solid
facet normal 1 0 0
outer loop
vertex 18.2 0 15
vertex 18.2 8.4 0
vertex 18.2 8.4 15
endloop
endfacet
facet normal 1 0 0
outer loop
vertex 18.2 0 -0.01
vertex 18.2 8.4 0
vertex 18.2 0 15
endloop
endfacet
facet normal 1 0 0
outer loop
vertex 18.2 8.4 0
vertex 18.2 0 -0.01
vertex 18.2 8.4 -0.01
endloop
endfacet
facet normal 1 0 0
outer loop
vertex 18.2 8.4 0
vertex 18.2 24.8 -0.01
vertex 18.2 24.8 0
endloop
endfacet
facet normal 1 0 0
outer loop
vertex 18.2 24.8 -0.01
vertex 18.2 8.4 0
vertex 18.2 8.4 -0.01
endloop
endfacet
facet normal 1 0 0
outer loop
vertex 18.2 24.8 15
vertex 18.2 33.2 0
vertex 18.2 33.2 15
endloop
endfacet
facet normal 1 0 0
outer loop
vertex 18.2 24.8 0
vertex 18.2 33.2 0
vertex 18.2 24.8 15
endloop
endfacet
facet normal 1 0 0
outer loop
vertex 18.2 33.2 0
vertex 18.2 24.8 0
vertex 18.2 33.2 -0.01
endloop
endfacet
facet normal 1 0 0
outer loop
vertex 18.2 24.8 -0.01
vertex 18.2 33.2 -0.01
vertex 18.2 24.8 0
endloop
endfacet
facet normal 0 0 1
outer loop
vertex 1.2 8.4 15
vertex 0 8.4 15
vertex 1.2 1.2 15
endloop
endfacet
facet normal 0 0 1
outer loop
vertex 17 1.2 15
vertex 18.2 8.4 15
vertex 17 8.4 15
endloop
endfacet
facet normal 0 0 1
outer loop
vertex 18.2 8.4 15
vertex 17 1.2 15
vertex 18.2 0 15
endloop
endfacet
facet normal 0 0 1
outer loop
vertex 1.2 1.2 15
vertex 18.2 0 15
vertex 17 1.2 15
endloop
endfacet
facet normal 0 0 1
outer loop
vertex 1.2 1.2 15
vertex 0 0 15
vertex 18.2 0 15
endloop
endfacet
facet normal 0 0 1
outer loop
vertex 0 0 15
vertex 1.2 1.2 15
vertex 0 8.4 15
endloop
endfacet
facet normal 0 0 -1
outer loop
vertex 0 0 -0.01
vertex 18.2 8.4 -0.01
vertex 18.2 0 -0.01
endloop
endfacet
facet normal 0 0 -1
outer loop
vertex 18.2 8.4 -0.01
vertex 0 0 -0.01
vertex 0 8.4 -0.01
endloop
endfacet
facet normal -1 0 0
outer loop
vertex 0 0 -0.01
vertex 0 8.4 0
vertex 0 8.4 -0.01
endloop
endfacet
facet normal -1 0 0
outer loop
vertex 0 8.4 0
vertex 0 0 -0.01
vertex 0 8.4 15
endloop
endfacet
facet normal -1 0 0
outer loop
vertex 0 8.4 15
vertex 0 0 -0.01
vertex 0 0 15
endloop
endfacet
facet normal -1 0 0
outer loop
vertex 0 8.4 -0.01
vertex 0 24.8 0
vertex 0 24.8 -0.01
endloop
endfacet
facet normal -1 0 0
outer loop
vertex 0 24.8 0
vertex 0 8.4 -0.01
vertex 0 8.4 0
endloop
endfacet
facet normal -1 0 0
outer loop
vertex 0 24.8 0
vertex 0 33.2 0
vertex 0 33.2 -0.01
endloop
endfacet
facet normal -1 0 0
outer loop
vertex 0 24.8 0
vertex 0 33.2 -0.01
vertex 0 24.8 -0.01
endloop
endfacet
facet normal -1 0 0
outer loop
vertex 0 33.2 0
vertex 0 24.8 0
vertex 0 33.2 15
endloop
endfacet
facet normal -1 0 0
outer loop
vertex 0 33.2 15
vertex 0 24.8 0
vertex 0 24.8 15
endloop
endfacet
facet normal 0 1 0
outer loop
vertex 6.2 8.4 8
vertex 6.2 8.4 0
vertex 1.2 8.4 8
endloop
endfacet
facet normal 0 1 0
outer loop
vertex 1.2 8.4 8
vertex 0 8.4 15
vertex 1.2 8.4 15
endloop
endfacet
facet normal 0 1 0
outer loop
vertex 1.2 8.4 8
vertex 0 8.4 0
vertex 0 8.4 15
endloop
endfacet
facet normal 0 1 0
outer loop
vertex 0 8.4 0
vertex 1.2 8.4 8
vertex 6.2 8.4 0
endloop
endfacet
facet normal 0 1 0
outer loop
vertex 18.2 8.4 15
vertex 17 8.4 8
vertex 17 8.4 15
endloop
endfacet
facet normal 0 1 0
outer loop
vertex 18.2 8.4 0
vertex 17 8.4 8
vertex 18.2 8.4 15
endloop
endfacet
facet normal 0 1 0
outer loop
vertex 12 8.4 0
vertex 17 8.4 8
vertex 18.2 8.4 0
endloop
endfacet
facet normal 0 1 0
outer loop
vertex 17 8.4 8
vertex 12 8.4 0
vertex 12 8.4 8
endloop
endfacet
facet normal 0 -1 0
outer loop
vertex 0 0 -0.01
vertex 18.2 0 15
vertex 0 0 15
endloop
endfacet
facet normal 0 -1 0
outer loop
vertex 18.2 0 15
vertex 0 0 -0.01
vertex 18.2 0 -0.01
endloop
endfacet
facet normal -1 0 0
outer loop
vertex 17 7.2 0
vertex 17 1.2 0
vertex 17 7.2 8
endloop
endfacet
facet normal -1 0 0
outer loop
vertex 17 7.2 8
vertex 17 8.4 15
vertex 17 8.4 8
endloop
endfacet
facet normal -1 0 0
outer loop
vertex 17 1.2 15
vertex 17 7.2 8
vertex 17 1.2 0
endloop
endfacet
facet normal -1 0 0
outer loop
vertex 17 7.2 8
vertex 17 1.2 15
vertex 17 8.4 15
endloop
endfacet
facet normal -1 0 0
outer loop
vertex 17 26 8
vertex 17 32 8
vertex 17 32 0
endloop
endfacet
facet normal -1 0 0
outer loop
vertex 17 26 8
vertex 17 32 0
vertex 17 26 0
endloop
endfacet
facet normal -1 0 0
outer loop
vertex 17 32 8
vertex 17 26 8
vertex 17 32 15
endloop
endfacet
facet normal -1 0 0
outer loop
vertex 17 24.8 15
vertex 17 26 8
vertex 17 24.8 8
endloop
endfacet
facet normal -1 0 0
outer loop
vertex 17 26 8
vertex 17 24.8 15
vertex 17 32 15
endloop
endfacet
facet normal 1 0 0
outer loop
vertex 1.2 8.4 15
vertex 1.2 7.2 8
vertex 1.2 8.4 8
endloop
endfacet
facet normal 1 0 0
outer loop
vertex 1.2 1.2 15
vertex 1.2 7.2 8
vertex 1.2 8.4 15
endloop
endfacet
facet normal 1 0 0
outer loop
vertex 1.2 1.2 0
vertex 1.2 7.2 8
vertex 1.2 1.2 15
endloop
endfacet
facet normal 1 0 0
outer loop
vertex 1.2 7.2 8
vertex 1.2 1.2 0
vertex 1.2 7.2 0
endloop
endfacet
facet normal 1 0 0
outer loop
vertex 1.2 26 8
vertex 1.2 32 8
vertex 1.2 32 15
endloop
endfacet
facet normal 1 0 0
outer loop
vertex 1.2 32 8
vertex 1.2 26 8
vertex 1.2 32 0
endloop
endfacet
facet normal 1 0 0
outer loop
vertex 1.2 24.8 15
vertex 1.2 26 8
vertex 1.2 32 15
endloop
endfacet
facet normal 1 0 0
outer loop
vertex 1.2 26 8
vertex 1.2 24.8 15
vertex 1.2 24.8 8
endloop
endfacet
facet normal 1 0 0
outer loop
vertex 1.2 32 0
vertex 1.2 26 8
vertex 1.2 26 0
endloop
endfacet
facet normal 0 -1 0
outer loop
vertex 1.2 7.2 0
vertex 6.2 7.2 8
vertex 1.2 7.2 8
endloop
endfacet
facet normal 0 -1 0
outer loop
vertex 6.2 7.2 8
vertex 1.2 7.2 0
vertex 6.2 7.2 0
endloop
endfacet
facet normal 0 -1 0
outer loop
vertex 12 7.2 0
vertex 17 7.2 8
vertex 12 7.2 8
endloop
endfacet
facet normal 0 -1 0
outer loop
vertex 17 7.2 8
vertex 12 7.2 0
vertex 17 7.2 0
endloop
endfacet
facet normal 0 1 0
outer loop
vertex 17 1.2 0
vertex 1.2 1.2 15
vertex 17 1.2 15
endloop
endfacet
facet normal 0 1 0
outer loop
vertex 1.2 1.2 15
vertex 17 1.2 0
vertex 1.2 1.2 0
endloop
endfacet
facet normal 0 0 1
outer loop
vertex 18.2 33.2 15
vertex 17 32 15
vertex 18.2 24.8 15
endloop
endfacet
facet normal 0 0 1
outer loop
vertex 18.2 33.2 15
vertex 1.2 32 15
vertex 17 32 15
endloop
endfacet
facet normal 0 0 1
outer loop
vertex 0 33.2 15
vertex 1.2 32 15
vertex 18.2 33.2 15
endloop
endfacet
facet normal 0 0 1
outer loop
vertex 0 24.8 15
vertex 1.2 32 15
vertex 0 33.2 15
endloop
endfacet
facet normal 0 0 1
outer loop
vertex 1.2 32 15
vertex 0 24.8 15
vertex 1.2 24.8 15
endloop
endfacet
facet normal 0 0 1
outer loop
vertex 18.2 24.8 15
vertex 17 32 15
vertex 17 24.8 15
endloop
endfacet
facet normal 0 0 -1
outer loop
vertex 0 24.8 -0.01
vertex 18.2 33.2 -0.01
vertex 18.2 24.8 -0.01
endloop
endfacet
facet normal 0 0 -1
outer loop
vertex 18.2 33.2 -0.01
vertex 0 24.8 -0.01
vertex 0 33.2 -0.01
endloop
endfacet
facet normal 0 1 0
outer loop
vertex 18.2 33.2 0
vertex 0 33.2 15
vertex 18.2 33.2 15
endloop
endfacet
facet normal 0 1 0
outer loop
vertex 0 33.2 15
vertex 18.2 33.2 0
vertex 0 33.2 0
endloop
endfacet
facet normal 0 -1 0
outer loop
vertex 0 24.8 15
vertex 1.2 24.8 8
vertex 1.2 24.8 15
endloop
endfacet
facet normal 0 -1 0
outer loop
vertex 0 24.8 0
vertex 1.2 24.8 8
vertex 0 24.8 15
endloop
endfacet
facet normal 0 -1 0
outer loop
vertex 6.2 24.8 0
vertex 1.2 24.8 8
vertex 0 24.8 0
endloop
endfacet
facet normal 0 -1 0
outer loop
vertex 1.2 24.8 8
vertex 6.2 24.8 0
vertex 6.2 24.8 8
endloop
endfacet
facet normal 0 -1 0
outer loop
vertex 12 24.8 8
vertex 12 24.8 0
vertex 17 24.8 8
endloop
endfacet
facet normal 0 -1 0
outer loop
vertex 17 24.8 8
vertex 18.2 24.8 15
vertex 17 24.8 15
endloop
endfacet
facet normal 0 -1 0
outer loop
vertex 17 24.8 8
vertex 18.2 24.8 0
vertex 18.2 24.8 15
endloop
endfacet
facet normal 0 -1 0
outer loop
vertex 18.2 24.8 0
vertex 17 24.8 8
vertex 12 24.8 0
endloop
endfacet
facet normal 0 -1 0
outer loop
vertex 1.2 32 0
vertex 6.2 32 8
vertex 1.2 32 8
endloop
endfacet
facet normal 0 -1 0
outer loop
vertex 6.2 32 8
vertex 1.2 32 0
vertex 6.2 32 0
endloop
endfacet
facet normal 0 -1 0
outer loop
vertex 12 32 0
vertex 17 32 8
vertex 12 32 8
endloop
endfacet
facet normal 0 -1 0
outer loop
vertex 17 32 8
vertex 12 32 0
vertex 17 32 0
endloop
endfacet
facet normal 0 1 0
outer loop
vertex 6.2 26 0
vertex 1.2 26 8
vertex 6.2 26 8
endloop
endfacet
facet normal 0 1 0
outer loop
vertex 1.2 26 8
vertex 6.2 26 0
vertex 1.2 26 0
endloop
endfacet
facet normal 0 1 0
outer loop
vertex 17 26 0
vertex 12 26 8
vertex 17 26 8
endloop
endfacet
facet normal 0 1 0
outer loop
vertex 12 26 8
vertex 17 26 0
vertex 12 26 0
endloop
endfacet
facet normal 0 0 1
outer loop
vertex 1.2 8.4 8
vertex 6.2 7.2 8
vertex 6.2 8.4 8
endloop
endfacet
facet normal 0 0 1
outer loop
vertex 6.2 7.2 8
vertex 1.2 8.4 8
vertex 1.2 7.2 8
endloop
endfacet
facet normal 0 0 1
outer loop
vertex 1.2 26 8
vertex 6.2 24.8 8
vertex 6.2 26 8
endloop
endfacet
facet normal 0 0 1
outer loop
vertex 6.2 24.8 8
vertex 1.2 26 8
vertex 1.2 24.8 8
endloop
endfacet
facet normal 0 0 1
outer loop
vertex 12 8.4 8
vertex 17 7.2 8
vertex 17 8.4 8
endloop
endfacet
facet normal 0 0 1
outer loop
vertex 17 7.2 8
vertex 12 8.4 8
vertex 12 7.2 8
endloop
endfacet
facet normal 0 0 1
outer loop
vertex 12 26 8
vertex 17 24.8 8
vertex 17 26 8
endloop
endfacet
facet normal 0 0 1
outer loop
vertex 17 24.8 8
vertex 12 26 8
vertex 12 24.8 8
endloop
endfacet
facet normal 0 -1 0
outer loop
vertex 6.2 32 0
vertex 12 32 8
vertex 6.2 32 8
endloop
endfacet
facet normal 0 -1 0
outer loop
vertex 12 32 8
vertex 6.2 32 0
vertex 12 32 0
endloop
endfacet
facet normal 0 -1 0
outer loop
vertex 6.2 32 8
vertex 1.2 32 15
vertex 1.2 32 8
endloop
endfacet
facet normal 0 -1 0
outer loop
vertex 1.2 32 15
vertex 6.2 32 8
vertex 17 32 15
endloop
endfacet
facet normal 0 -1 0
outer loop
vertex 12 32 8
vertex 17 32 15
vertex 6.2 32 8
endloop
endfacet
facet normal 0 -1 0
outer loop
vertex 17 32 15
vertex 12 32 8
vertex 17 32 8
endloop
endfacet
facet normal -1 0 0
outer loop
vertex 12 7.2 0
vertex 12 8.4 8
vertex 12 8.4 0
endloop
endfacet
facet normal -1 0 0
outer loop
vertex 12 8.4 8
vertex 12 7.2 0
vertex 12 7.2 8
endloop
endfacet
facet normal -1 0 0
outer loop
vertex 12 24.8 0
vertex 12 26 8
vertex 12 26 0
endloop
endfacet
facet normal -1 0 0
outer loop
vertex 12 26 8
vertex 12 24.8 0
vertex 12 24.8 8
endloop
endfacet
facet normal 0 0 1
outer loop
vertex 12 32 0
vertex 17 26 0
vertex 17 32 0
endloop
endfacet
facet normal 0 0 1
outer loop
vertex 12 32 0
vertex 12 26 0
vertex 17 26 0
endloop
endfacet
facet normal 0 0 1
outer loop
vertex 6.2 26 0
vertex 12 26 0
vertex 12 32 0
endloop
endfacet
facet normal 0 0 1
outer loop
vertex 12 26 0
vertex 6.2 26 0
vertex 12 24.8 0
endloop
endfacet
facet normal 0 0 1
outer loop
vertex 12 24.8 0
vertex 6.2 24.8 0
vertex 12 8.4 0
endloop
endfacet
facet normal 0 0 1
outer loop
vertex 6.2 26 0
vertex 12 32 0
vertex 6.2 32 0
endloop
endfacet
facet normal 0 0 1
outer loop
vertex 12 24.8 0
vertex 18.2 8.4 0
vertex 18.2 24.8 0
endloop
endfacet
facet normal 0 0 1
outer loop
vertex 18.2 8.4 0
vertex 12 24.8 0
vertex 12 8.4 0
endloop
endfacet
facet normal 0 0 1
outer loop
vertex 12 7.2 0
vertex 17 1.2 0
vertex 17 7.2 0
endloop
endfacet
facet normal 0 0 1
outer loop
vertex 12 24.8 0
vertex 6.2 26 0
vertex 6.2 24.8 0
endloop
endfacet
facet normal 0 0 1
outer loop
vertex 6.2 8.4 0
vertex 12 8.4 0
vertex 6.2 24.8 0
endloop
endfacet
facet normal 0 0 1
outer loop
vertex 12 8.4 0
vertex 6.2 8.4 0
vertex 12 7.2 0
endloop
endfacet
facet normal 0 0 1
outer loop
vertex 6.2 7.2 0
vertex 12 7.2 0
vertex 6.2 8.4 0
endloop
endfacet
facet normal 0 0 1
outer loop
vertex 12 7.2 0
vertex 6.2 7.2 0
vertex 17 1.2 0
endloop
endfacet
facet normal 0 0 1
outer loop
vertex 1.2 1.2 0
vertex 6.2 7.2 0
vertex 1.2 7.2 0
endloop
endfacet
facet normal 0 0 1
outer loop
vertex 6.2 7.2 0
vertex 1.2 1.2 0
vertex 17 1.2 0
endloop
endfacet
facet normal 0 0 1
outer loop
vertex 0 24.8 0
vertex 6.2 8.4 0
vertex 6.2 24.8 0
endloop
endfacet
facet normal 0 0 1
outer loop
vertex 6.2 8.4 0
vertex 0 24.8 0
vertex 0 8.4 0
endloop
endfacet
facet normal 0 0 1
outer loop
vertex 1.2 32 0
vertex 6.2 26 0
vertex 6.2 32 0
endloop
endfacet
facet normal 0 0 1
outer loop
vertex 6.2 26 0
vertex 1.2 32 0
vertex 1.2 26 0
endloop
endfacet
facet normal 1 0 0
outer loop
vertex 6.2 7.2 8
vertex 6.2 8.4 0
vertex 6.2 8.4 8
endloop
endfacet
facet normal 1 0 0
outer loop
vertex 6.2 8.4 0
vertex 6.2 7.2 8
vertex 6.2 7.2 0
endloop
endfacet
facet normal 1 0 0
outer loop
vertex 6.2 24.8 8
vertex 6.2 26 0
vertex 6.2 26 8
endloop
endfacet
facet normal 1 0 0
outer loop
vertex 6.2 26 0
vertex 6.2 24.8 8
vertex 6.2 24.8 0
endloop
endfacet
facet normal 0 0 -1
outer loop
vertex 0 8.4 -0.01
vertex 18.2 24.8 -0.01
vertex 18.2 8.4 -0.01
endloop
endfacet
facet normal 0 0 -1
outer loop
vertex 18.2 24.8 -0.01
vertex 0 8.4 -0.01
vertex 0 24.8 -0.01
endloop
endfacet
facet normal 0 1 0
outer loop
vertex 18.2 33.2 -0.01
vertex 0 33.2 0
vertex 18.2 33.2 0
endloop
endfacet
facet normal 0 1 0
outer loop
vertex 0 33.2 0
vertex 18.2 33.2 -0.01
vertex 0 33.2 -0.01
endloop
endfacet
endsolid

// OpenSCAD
// file: ../Base/Boxes.scad
// Fischertechnik Box Foundation
// Pre-designed Boxes

use <Constants.scad>

include <PlacementOptions.scad>

box190Width = 190;
box190Depth = 130;
box130Width = 130;
box130Depth = 95;
boxUsageHeight = 33.9;
boxWallThickness = 2.4;
boxBaseThickness = 1.0;

// getBoxWallThickness()
// Gets the wall thickness of a Fischertechnik Box

function getBoxWallThickness() = boxWallThickness;

// Gets the usable height of a fischertechnik box
function getBoxUsageHeight() = boxUsageHeight;

// Gets the thickness of the Fischertechnik box base.
function getBoxBaseThickness() = boxBaseThickness;

// Gets the usable inner space of a Box 190 as an x/y-list
function getBox190Space() = [
    box190Width - 2*getBoxWallThickness(), 
    box190Depth - 2*getBoxWallThickness() ];

// Imports the Fischertechnik empty box 130x190 mm and places it at position 0,0
// 190x130 are the outer sizes, the inner space is slightly smaller. Use getBox190Space() to get the inner sizes.
// This module needs the STL file "Fischertechnik Box 130x190.stl" in the library path.
// The box is positioned that the usable inner space is at the 0,0,0 position. The

module Box190() {
    translate([-getBoxWallThickness(),-getBoxWallThickness(),-getBoxBaseThickness()])
        import("Fischertechnik Box 130x190.stl", convexity=3);
}

// Gets the usable inner space of a Box 130 as an x/y-list
function getBox130Space() = [
    box130Width - 2*getBoxWallThickness(), 
    box130Depth - 2*getBoxWallThickness() ];

// Imports the Fischertechnik empty box 95x130 mm and places it at position 0,0
// 190x130 are the outer sizes, the inner space is slightly smaller. Use getBox190Space() to get the inner sizes.
// This module needs the STL file "Fischertechnik Box 95x130.stl" in the library path.
// The box is positioned that the usable inner space is at the 0,0,0 position. The

module Box130() {
    translate([-getBoxWallThickness(),-getBoxWallThickness(),-getBoxBaseThickness()])
        import("Fischertechnik Box 95x130.stl", convexity=3);
}

// Creates a web at the specified box walls
// corner 0 = LowerLeft, 1 = UpperLeft, 2 = UpperRight, 3 = LowerRight
// side 0 = LeftOfCorner, 1 = RightOfCorner
// distance = Distance in mm from the corner
// box = inner width and depth of the box (default: Box 190)
// webWidth = length of the web (default is 3 mms)
// webThickness = thickness of the web (default is 1 mm)

module BoxWeb(corner, side, distance, box=getBox190Space(), webWidth=3, webThickness=1.0) {
    sink = getBoxWallThickness()/2;

    width = (corner % 2 == 0) ? 
            (side == LeftOfCorner ? webWidth : webThickness) :
            (side == LeftOfCorner ? webThickness : webWidth);

    depth = (corner % 2 == 0) ? 
            (side == RightOfCorner ? webWidth : webThickness) :
            (side == RightOfCorner ? webThickness : webWidth);
    
    xDiff = corner == LowerLeft ? 
                (side == LeftOfCorner ? -sink : distance) :
            (corner == UpperLeft ?                
                (side == LeftOfCorner ? distance : -sink) :
            (corner == UpperRight ?
                (side == LeftOfCorner ? box.x-webWidth+sink : box.x-distance-webThickness) :
                (side == LeftOfCorner ? box.x-distance-webThickness: box.x-webWidth+sink)));

    yDiff = corner == LowerLeft ? 
                (side == RightOfCorner ? -sink : distance) :
            (corner == UpperLeft ?
                (side == RightOfCorner ? box.y-distance : box.y-webWidth+sink) :
            (corner == UpperRight ?
                (side == RightOfCorner ? box.y-webWidth+sink : box.y-distance) :
                (side == RightOfCorner ? distance : -sink)));
    
    translate([xDiff, yDiff, -getExcess()])
        cube([width, depth, boxUsageHeight + 2*getExcess()]);
}
// file: ../Base/Rotation.scad
// Fischertechnik Box Foundation
// Geometry Helpers Rotation

include <PlacementOptions.scad>

// getRotatedSpace(space, rotation=NoRotation)
// Rotates the space dependent on the specified rotation

function getRotatedSpace(space, rotation=NoRotation) = [
    (rotation == Rotate90 || rotation == Rotate270) ? space.y : space.x,
    (rotation == Rotate90 || rotation == Rotate270) ? space.x : space.y
];

// Rotates the given space around the fixed left lower corner
// space = the space the children needs as width/depth list [width,depth]
// rotation = 0 Rotate0 degrees, 1 Rotate90 degrees, 2 Rotate180 degrees, 3 Rotate270 degrees (equivalent to -90)

module RotateFix(space, rotation=Rotate0) {
    dy = (rotation == Rotate0 || rotation == Rotate270) ? 0 :
        (rotation == Rotate90) ? space.x :
        space.y;
    dx = (rotation < Rotate180) ? 0 :
        (rotation == Rotate180) ? space.x :
        space.y;
    
    translate([dx, dy, 0])
        rotate([0, 0, rotations[rotation]])
            children();
}
// file: ../Base/Alignment.scad
// Fischertechnik Box Foundation
// Geometry Helpers Alignment

include <PlacementOptions.scad>

// getAlignedX(elementWidth, spaceWidth, align=AlignRight, offset=0)
// Gets the aligned X offset of an element with the given
// width in the given space.
// elementWidth = The width of the element to positon
// spaceWidth = The space where the element should be aligned
// align = 0 AlignLeft, 1 AlignCenter, 2 AlignRight
// offset = an optional offset from the aligned position. When
// aligned left or centered, then positive values are in X direction.
// When aligned right then positive values are in negative X direction.

function getAlignedX(elementWidth, spaceWidth, align=AlignRight, offset=0) =
    (align == AlignLeft) ?
        offset :
        ((align == AlignCenter) ?
        (spaceWidth - elementWidth)/2 + offset :
        spaceWidth - offset - elementWidth);

// getAlignedY(elementDepth, spaceDepth, align=AlignTop, offset=0)
// Gets the aligned Y offset of an element with the given
// depth in the given space.
// elementDepth = The depth of the element to positon
// spaceDepth = The space where the element should be aligned
// align = 0 AlignBottom, 1 AlignCenter, 2 AlignTop
// offset = an optional offset from the aligned position. When
// aligned bottom or centered, then positive values are in Y direction.
// When aligned top then positive values are in negative Y direction.

function getAlignedY(elementDepth, spaceDepth, align=AlignTop, offset=0) =
    (align == AlignBottom) ?
        offset :
        ((align == AlignCenter) ?
        (spaceDepth - elementDepth)/2 + offset :
        spaceDepth - offset - elementDepth);
// file: ../Base/PlacementOptions.scad
// Fischertechnik Box Foundation
// Placement Options

// Alignment
NoAlign = 0;
AlignLeft = 1;
AlignBottom = 2;
AlignCenter = 3;
AlignRight = 4;
AlignTop = 5;

// Element rotation degree steps
rotations = [0, -90, -180, -270];

// Rotation
NoRotation = 0;
Rotate0 = 0;
Rotate90 = 1;
Rotate180 = 2;
Rotate270 = 3;

// Docking (seen from above)
NoDock = -1;
DockLeft = 0;
DockTop = 1;
DockRight = 2;
DockCorner = 2;
DockBottom = 3;

// Web corners
LowerLeft = 0;
UpperLeft = 1;
UpperRight = 2;
LowerRight = 3;

// Web position relative to corner
LeftOfCorner = 0;
RightOfCorner = 1;
// file: ../Base/Placement.scad
// Fischertechnik Box Foundation
// Geometry Helpers Placement

use <Constants.scad>
use <Alignment.scad>
use <Rotation.scad>
use <Boxes.scad>

include <PlacementOptions.scad>

// Place(x=0, y=0, elementSpace=[0,0], alignX=AlignLeft, alignY=AlignBottom, rotation=Rotate0, boxSpace=getBox190Space())
// Places the child at the specified position
// y = Y-Position. This is a relative position when an X aligment is specified.
// x = X-Position. This is a relative position when an Y aligment is specified.
// elementSpace = space of the element to be placed [x,y]
// alignX = -1=NoAlign, 0 AlignLeft, 1 AlignCenter, 3 AlignRight (elementSpace and boxSpace required!)
// alignY = -1=NoAlign, 2 AlignBottom, 1 AlignCenter, 4 AlignTop (elementSpace and boxSpace required!)
// rotation = 0 Rotate0 0 degrees, 1 Rotate90 90 degrees, 
// 2 Rotate180 180 degrees, 3 Rotate270 270 degrees (equivalent to -90)
// boxSpace = Inner space of the box where the placement occurs [x,y] - default is Box 190x130 inner space

module Place(x=0, y=0, elementSpace=[0,0], 
  alignX=AlignLeft, alignY=AlignBottom, 
  rotation=NoRotation, boxSpace=getBox190Space()) {

    module Position(x, y, space, rotation=Rotate0) {
        translate([x, y, 0])
            RotateFix(space, rotation)
                children(0);
    }

    space = getRotatedSpace(elementSpace, rotation);
    alignedX = getAlignedX(space.x, boxSpace.x, alignX, x);
    alignedY = getAlignedY(space.y, boxSpace.y, alignY, y);
    Position(alignedX, alignedY, elementSpace, rotation)
        children(0);
}

// Center(space=getBox130Space(), elementSpace=[0,0])
// space = Space where the children is centered. For cylinder use centered=true and no elementSpace.
// elementSpace = space of the element to be centered [x,y]

module Center(space=getBox190Space(), elementSpace=[0,0]) {
    translate([(space.x - elementSpace.x) / 2, (space.y - elementSpace.y) / 2])
        children(0);
}

// CenterHorizontal(width=0, y=0, offset=0, space=getBox130Space())
// space = Space where the children is centered. For cylinder use centered=true and no elementSpace.
// elementSpace = space of the element to be centered [x,y]

module CenterHorizontal(width=0, y=0, offset=0, space=getBox190Space()) {
    translate([(space.x - width) / 2 + offset, y])
        children(0);
}

// CenterVertical(depth=0, x=0, offset=0, space=getBox130Space())
// space = Space where the children is centered. For cylinder use centered=true and no elementSpace.
// elementSpace = space of the element to be centered [x,y]

module CenterVerticalal(depth=0, x=0, offset=0, space=getBox190Space()) {
    translate([x, (space.y - depth) / 2 + offset])
        children(0);
}
// file: ../Base/Constants.scad
// Fischertechnik Box Foundation
// Constants

// Constant values necessary for multiple elements

// Base constants
dividerThickness = 1.2;
excess = 0.01;
fragments = 90;
tolerance = 0.8;

// Gets the thickness of a divider 
function getDividerThickness() = dividerThickness;

// Gets the excess that is used to merge walls into each other
function getExcess() = excess;

// Gets amount of fragments of a cylinder
function getFragments() = fragments;

// Gets the inner tolerance of a frame to each side
function getTolerance() = tolerance;


// Fischertechnik specific constants
axisDiameter = 4;
axisBottomDiameter = axisDiameter + 1;
standardEdgeDistance = 2.5;
standardWebDistance = 11.5;
standardCornerLength = 15;
tubeWallFactor = 1.6;

// Gets axis diameter
function getAxisDiameter() = axisDiameter;

// Gets axis bottom diameter for thicker part at the bottom
function getAxisBottomDiameter() = axisBottomDiameter;

// gets the standard distance to the wall of the box for dockable frames with webs
function getStandardEdgeDistance() = standardEdgeDistance;

// gets the standard distance of each web to the corner of the dockable frame
function getStandardWebDistance() = standardWebDistance;

// gets the standard length of the corner walls of a dockable frame
function getStandardCornerLength() = standardCornerLength;

// gets the wall thickness of a tube.
function getTubeWallThickness() = tubeWallFactor * getDividerThickness();
// main file
// Fischertechnik Box Library
// Frame for Plane Mirror
// 31368 

use <../ModelBase/Simple.scad>
use <../ModelBase/Complex.scad>

width = 15;
depth = 30;
height = 8.0;

// getFramePlaneMirrorSpace()
// Gets the outer space the aperture frame needs.

function getFramePlaneMirrorSpace() = getFrameOuterVolume([width, depth, height]);

// FramePlaneMirror()
// Frame for a 15x30 mm plane mirror.

module FramePlaneMirror() {
    
    FrameSpecialFlat([width, depth, height]);
}

// Tests
color("lightgray") {
    FramePlaneMirror();
}
